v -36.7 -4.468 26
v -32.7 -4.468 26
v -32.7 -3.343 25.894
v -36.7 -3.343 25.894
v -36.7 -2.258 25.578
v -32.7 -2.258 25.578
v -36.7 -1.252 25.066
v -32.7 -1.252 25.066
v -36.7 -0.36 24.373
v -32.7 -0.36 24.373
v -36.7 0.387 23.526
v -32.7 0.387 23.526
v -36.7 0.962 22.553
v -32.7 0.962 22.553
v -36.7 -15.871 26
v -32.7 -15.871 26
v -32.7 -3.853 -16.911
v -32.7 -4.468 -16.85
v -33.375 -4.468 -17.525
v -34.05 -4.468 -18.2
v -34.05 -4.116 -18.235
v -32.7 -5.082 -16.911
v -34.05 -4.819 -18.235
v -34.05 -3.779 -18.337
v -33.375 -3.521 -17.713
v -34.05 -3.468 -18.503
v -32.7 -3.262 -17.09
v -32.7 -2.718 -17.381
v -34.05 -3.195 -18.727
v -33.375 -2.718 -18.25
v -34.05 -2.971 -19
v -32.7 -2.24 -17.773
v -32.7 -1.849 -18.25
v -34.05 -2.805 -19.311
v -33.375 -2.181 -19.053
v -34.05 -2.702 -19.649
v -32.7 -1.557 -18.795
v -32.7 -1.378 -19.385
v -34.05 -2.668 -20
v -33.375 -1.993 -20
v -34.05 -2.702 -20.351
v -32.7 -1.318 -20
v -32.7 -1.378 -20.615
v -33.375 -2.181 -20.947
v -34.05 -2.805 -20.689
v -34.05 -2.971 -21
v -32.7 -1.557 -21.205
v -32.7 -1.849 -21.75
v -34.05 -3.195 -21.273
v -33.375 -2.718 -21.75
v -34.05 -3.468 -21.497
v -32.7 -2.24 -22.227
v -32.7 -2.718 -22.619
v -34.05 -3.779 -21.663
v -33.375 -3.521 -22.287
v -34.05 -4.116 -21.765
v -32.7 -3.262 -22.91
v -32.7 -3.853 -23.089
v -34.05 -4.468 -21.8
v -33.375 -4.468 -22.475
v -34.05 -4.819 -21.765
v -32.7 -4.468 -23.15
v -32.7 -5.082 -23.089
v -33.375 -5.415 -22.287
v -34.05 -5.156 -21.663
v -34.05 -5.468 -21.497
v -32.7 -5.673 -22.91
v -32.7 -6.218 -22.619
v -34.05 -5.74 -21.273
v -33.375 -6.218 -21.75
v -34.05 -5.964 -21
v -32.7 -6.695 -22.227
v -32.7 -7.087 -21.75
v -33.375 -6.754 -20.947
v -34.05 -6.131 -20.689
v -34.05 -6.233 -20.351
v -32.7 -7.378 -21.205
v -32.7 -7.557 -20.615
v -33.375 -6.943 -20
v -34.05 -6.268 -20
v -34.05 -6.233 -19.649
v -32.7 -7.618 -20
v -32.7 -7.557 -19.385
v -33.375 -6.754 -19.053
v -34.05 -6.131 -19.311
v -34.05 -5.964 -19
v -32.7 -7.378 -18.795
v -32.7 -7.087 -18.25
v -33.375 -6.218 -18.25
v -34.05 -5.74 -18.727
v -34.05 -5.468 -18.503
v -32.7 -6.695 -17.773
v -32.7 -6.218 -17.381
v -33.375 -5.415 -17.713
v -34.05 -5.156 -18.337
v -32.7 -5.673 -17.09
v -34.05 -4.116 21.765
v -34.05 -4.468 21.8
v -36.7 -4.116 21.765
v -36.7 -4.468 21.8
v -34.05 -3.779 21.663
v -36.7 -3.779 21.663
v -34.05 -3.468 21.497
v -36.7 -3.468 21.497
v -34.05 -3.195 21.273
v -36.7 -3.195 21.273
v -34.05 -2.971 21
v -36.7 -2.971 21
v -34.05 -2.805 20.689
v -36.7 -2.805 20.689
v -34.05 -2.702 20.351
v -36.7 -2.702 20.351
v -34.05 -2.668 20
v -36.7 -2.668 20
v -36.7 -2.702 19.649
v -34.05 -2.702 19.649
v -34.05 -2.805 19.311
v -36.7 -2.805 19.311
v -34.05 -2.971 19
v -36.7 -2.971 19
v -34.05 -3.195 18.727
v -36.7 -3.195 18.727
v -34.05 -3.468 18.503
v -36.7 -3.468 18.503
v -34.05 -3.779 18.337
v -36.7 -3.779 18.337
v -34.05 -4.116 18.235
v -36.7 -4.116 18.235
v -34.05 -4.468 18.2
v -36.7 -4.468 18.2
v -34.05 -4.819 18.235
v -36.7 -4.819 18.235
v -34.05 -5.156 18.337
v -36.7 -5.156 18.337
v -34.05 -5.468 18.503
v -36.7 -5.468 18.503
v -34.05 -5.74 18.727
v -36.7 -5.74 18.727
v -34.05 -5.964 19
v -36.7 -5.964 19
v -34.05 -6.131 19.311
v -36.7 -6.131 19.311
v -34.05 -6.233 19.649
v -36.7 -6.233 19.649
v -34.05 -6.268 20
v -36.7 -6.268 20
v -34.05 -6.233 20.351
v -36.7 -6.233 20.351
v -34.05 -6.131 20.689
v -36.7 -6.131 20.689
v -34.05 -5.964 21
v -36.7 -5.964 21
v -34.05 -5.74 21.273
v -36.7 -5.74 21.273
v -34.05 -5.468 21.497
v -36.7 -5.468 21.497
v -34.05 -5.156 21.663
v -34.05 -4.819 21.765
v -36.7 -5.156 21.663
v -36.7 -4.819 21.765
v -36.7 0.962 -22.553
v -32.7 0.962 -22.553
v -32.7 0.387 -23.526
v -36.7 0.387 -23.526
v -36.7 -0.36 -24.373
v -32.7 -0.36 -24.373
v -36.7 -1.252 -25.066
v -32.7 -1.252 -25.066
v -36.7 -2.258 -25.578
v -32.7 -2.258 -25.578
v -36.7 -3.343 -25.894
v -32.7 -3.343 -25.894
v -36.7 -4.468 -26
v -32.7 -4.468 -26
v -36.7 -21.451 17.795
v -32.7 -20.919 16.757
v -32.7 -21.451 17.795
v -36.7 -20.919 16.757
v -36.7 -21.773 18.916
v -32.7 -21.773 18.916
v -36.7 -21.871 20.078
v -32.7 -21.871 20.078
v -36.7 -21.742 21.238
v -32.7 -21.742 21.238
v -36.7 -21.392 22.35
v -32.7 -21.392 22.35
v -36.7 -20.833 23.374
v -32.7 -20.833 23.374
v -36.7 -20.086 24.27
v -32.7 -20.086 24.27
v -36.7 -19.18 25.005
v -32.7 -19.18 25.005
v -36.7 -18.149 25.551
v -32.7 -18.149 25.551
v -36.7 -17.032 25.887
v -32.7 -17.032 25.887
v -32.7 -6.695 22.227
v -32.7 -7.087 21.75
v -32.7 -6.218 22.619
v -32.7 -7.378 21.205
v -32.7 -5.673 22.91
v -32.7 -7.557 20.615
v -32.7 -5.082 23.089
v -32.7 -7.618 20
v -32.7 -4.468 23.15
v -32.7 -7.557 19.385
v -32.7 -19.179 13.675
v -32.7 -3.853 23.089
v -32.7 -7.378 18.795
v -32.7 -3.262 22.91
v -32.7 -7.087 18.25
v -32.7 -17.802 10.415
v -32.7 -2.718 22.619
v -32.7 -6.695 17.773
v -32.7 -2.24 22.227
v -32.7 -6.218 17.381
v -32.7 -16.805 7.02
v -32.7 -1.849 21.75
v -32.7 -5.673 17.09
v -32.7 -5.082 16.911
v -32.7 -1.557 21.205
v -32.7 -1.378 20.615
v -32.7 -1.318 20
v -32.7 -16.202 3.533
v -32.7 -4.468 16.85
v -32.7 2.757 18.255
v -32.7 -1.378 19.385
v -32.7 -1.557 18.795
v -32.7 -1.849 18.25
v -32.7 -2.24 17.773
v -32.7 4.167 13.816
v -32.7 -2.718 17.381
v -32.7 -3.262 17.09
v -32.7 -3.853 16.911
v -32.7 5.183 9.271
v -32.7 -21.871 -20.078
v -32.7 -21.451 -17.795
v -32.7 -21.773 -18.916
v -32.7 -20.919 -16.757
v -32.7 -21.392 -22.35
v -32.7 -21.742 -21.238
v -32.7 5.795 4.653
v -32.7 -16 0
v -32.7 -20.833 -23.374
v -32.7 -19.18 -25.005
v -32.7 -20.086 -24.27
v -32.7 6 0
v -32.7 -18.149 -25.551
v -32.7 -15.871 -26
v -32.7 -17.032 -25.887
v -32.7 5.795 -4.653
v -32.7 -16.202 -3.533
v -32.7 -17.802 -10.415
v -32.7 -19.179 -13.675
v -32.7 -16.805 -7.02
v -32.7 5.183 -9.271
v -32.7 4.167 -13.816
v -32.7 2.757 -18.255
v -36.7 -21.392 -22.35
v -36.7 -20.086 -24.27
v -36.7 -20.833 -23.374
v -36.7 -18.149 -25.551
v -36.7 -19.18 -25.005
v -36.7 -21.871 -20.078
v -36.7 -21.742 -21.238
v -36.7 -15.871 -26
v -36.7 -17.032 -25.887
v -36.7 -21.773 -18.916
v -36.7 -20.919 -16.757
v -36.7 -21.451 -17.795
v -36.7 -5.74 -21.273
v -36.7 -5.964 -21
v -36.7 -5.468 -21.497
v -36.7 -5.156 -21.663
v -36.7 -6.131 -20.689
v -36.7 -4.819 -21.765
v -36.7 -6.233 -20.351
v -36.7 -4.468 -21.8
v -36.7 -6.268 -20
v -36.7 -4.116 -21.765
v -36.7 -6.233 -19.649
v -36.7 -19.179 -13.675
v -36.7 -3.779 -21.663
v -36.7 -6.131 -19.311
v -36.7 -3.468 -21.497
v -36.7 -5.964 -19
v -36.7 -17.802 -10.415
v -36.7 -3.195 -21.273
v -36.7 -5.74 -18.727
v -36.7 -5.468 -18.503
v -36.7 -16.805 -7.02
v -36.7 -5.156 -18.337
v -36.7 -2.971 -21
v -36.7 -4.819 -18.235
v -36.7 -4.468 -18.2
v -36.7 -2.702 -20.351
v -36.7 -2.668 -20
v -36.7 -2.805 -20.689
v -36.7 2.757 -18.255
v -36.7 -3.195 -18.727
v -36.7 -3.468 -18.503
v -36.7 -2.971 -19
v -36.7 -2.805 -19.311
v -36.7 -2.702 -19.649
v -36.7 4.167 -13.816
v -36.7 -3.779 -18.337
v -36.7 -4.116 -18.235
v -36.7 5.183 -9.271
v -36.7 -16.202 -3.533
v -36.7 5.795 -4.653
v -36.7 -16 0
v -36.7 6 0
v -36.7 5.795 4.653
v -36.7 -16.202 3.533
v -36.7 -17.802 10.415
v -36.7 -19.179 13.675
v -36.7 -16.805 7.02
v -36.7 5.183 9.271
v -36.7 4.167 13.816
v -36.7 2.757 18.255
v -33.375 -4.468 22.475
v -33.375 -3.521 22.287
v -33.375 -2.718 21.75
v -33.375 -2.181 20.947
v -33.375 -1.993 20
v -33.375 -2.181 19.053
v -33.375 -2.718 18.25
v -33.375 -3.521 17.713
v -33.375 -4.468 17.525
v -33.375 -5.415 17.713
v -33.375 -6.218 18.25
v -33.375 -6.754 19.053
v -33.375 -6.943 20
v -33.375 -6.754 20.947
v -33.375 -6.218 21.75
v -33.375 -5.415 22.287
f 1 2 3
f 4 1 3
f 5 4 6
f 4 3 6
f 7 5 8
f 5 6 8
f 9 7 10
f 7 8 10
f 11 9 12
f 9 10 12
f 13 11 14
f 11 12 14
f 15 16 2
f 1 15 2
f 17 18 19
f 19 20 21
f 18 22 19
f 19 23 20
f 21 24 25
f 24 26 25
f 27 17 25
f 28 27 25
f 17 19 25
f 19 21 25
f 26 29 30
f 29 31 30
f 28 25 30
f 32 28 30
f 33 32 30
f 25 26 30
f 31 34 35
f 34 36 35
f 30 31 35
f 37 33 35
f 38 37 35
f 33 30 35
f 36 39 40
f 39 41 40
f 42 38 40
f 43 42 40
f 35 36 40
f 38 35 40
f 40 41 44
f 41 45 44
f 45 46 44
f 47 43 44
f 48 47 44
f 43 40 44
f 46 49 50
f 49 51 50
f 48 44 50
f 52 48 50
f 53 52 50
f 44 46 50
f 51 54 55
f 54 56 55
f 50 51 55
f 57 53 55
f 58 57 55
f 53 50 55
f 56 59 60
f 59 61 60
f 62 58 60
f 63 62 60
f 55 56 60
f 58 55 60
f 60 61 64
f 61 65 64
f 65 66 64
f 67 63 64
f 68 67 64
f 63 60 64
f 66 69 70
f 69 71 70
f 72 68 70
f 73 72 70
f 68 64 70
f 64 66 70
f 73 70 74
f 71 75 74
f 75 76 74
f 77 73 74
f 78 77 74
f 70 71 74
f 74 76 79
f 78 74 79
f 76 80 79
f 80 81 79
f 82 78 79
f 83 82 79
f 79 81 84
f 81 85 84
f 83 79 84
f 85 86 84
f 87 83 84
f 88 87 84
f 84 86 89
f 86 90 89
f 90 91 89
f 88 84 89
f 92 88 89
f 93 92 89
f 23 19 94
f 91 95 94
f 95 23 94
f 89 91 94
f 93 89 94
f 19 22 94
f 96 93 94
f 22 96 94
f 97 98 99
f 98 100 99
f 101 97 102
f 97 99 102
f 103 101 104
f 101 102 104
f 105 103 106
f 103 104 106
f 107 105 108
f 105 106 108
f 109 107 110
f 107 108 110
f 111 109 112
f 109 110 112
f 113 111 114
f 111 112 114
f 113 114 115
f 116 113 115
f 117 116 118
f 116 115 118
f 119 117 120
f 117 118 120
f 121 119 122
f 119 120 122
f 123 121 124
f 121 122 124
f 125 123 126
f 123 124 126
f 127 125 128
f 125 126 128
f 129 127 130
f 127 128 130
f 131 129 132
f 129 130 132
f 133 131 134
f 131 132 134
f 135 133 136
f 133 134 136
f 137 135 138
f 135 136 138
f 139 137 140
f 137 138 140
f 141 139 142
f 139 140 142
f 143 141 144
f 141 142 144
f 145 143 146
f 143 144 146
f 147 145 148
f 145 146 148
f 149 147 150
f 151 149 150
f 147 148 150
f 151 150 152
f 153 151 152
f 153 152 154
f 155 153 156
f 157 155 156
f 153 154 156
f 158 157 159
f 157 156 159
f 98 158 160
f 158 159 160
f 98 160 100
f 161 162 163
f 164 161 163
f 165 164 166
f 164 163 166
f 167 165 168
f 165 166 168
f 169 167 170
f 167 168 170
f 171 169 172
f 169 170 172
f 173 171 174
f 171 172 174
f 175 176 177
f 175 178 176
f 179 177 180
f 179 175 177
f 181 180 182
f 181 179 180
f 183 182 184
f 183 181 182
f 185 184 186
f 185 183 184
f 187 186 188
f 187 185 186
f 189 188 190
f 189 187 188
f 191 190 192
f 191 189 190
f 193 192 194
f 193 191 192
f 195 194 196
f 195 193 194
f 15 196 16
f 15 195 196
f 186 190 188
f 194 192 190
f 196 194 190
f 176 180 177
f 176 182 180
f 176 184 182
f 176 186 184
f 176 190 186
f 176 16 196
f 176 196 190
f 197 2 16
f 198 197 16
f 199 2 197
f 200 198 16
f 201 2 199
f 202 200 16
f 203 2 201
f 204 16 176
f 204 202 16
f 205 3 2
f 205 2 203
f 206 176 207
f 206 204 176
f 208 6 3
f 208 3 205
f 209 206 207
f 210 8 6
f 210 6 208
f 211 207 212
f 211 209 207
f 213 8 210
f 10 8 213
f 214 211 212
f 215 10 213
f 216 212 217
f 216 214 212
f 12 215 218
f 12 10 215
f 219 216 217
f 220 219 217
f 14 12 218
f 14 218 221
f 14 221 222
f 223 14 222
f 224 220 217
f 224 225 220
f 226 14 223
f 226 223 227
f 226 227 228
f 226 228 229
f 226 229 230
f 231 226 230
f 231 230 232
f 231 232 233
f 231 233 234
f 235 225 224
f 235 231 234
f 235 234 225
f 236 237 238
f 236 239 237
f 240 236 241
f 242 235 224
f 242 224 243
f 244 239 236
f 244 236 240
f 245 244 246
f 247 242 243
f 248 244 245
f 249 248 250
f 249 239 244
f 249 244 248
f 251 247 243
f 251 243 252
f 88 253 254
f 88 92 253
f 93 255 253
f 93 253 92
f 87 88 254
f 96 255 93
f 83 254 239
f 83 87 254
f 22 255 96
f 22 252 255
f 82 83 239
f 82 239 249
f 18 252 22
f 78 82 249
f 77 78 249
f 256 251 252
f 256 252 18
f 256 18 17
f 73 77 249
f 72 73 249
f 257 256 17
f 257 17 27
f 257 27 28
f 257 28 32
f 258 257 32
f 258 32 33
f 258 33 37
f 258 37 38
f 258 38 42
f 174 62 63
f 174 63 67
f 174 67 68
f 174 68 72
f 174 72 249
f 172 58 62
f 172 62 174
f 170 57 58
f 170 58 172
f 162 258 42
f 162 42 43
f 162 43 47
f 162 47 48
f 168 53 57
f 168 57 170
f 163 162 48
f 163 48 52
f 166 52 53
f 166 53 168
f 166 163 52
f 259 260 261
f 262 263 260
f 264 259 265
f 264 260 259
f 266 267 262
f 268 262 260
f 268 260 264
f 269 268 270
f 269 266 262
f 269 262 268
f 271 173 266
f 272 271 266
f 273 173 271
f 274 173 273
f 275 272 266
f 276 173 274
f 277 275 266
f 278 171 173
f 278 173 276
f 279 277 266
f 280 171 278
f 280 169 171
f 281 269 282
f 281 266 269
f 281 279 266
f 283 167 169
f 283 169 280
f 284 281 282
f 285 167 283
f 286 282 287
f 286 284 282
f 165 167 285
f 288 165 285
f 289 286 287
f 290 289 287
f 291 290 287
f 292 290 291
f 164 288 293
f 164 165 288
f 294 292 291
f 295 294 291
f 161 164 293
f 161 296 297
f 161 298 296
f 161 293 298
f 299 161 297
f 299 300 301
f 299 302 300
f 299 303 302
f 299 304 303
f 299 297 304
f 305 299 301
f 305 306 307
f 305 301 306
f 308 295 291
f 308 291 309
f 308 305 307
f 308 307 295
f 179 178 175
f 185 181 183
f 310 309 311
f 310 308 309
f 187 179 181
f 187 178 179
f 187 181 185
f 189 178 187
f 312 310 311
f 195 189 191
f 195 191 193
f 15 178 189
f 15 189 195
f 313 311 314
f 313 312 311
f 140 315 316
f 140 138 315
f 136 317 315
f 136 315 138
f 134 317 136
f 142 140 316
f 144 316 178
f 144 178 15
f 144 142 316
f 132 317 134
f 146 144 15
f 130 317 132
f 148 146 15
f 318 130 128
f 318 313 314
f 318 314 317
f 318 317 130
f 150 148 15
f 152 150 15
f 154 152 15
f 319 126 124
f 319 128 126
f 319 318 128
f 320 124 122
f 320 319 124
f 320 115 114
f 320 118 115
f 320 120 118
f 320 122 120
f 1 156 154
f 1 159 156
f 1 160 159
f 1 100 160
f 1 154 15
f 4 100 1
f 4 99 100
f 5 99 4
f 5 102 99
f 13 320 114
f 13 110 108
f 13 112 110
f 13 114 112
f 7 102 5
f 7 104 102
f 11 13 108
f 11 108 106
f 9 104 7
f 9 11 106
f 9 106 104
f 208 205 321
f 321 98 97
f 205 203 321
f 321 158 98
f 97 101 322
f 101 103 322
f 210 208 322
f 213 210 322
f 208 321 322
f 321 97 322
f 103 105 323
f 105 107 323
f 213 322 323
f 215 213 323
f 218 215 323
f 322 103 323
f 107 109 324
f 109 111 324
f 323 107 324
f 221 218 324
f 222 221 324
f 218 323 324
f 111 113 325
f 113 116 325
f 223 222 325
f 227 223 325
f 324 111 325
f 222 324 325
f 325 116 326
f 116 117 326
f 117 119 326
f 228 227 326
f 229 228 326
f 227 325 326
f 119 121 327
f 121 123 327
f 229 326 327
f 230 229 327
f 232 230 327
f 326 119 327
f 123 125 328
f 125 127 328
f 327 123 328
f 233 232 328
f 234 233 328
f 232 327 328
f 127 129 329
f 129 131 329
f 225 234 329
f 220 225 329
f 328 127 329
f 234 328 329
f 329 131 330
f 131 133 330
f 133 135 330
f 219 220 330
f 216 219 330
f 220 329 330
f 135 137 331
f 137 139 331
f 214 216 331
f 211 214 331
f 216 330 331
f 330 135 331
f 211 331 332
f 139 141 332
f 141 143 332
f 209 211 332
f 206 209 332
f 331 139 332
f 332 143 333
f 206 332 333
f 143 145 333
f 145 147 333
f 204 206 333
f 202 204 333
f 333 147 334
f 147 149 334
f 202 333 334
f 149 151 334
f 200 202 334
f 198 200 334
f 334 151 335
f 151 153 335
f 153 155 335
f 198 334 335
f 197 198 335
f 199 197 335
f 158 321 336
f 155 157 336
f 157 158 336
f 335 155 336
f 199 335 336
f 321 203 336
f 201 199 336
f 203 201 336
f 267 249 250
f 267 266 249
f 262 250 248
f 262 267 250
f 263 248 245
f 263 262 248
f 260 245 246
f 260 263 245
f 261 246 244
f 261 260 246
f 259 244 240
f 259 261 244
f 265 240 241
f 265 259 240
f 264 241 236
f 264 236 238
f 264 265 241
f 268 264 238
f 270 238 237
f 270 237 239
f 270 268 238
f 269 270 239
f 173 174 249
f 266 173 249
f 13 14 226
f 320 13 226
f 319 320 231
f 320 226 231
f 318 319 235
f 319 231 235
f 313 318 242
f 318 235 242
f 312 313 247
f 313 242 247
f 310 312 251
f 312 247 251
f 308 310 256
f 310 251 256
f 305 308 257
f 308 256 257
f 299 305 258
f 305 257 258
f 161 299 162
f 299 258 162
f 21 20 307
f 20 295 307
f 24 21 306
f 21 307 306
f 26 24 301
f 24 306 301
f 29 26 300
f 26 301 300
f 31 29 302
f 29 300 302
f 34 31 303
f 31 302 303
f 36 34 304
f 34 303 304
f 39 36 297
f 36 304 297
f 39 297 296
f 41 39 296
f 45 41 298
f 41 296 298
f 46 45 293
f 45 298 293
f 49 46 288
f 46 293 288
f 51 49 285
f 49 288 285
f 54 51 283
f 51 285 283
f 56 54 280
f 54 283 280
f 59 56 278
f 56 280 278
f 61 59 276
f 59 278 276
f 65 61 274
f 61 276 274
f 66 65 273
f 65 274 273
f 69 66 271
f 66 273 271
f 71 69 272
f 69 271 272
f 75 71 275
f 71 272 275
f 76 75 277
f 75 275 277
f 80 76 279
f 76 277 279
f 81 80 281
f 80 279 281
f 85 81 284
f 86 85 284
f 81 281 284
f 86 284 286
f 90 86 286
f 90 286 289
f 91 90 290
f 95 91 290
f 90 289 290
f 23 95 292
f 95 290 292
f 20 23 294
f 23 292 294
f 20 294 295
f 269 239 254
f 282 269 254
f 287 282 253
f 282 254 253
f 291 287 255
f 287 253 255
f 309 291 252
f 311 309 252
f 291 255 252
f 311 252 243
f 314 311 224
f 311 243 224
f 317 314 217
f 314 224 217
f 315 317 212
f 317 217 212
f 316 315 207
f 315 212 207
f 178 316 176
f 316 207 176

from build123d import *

# Parameters (mm, degrees)
BOSS_EXTRUDE1_START                             = -32.7
SKETCH2_R                                       = 3
BOSS_EXTRUDE1_DEPTH                             = 4
FILLET1_R                                       = 6
CSK_FOR_M3_FLAT_HEAD_MACHINE_SCREW1_D           = 3.6
CSK_FOR_M3_FLAT_HEAD_MACHINE_SCREW1_CSINK_D     = 6.3
CSK_FOR_M3_FLAT_HEAD_MACHINE_SCREW1_CSINK_ANGLE = 90


with BuildPart() as part:
    # Sketch2 → Boss-Extrude1 (new body)
    # profile 1 of 4: a face of its own
    with BuildSketch(Plane(origin=(0, 0, 0), x_dir=(0, 0, -1), z_dir=(1, 0, 0)).offset(BOSS_EXTRUDE1_START)):
        with BuildLine():
            Line((26, -4.467659364), (26, -30.118056984))
            ThreePointArc((26, -30.118056984), (0, -16), (-26, -30.118056984))
            Line((-26, -30.118056984), (-26, -4.467659364))
            ThreePointArc((-26, -4.467659364), (-25.065528054, -1.252006159), (-22.553191489, 0.962001143))
            ThreePointArc((-22.553191489, 0.962001143), (0, 6), (22.553191489, 0.962001143))
            ThreePointArc((22.553191489, 0.962001143), (25.065528054, -1.252006159), (26, -4.467659364))
        make_face()
        with Locations((15, -2.457885097)):
            Circle(SKETCH2_R, mode=Mode.SUBTRACT)
        Circle(SKETCH2_R, mode=Mode.SUBTRACT)
        with Locations((-15, -2.457885097)):
            Circle(SKETCH2_R, mode=Mode.SUBTRACT)
    # profile 2 of 4: a face of its own
    with BuildSketch(Plane(origin=(0, 0, 0), x_dir=(0, 0, -1), z_dir=(1, 0, 0)).offset(BOSS_EXTRUDE1_START)):
        with Locations((-15, -2.457885097)):
            Circle(SKETCH2_R)
    # profile 3 of 4: a face of its own
    with BuildSketch(Plane(origin=(0, 0, 0), x_dir=(0, 0, -1), z_dir=(1, 0, 0)).offset(BOSS_EXTRUDE1_START)):
        Circle(SKETCH2_R)
    # profile 4 of 4: a face of its own
    with BuildSketch(Plane(origin=(0, 0, 0), x_dir=(0, 0, -1), z_dir=(1, 0, 0)).offset(BOSS_EXTRUDE1_START)):
        with Locations((15, -2.457885097)):
            Circle(SKETCH2_R)
    extrude(amount=-BOSS_EXTRUDE1_DEPTH)

    # Fillet1
    fillet1_edges = [part.edges().sort_by_distance(p)[0] for p in [
        (-34.7, -30.118056984, -26),
        (-34.7, -30.118056984, 26),
    ]]
    fillet(fillet1_edges, radius=FILLET1_R)

    # CSK for M3 Flat Head Machine Screw1 (through all)
    with Locations(Plane(origin=(-32.7, 0, 0), x_dir=(0, 0, -1), z_dir=(1, 0, 0))):
        with Locations((-20, -4.467659364), (20, -4.467659364)):
            CounterSinkHole(CSK_FOR_M3_FLAT_HEAD_MACHINE_SCREW1_D / 2, CSK_FOR_M3_FLAT_HEAD_MACHINE_SCREW1_CSINK_D / 2, counter_sink_angle=CSK_FOR_M3_FLAT_HEAD_MACHINE_SCREW1_CSINK_ANGLE)


solid = part.part
